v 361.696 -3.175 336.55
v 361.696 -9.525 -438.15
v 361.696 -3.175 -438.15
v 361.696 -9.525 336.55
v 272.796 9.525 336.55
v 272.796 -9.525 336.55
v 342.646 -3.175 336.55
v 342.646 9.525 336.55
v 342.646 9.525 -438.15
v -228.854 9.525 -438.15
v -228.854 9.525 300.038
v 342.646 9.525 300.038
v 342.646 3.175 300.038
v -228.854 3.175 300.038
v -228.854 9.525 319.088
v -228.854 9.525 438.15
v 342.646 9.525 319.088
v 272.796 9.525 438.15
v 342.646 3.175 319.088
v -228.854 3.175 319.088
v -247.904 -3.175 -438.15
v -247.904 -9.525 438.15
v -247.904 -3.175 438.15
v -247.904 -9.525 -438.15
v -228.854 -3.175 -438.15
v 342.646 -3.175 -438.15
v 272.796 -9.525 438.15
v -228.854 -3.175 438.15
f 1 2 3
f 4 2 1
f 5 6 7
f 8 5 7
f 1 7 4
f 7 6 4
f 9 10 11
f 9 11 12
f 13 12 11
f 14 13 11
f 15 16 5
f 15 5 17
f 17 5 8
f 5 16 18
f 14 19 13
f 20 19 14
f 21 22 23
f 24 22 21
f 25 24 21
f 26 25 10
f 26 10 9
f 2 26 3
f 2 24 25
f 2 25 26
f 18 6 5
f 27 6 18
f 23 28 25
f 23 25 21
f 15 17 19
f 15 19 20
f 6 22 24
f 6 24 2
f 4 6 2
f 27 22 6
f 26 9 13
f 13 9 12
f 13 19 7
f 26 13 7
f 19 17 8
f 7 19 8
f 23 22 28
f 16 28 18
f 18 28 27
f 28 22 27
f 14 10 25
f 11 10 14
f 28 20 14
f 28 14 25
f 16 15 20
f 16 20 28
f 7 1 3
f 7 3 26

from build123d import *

# Parameters (mm, degrees)
F0_W     = 609.6
F0_H     = 438.15
F1_DEPTH = 9.525
F2_W     = 19.05
F2_H     = 876.3
F3_DEPTH = 12.7
F4_W     = 571.5
F4_H     = 19.05
F5_DEPTH = 6.35
F6_W     = 88.9
F6_H     = 101.6
F7_DEPTH = 19.051


with BuildPart() as f1:
    # F0 (on Front) → F1 (new body, symmetric)
    with BuildSketch(Plane.XZ):
        with Locations((56.8960046741, 219.075)):
            Rectangle(F0_W, F0_H)
        with Locations((56.8960046741, -219.075)):
            Rectangle(F0_W, F0_H)
    extrude(amount=F1_DEPTH, both=True)

    # F2 (on face) → F3 (cut)
    with BuildSketch(Plane(origin=(0, 9.525, 0), x_dir=(-1, 0, 0), z_dir=(0, 1, 0))):
        with Locations((-352.1710046741, 0)):
            Rectangle(F2_W, F2_H)
        with Locations((238.3789953259, 0)):
            Rectangle(F2_W, F2_H)
    extrude(amount=-F3_DEPTH, mode=Mode.SUBTRACT)

    # F4 (on face) → F5 (cut)
    with BuildSketch(Plane(origin=(0, 9.525, 0), x_dir=(-1, 0, 0), z_dir=(0, 1, 0))):
        with Locations((-56.8960046741, 309.5625)):
            Rectangle(F4_W, F4_H)
    extrude(amount=-F5_DEPTH, mode=Mode.SUBTRACT)

    # F6 (on face) → F7 (cut, through all)
    with BuildSketch(Plane.XZ.offset(9.525)):
        with Locations((317.2460046741, 387.35)):
            Rectangle(F6_W, F6_H)
    extrude(amount=-F7_DEPTH, mode=Mode.SUBTRACT)


solid = f1.part
